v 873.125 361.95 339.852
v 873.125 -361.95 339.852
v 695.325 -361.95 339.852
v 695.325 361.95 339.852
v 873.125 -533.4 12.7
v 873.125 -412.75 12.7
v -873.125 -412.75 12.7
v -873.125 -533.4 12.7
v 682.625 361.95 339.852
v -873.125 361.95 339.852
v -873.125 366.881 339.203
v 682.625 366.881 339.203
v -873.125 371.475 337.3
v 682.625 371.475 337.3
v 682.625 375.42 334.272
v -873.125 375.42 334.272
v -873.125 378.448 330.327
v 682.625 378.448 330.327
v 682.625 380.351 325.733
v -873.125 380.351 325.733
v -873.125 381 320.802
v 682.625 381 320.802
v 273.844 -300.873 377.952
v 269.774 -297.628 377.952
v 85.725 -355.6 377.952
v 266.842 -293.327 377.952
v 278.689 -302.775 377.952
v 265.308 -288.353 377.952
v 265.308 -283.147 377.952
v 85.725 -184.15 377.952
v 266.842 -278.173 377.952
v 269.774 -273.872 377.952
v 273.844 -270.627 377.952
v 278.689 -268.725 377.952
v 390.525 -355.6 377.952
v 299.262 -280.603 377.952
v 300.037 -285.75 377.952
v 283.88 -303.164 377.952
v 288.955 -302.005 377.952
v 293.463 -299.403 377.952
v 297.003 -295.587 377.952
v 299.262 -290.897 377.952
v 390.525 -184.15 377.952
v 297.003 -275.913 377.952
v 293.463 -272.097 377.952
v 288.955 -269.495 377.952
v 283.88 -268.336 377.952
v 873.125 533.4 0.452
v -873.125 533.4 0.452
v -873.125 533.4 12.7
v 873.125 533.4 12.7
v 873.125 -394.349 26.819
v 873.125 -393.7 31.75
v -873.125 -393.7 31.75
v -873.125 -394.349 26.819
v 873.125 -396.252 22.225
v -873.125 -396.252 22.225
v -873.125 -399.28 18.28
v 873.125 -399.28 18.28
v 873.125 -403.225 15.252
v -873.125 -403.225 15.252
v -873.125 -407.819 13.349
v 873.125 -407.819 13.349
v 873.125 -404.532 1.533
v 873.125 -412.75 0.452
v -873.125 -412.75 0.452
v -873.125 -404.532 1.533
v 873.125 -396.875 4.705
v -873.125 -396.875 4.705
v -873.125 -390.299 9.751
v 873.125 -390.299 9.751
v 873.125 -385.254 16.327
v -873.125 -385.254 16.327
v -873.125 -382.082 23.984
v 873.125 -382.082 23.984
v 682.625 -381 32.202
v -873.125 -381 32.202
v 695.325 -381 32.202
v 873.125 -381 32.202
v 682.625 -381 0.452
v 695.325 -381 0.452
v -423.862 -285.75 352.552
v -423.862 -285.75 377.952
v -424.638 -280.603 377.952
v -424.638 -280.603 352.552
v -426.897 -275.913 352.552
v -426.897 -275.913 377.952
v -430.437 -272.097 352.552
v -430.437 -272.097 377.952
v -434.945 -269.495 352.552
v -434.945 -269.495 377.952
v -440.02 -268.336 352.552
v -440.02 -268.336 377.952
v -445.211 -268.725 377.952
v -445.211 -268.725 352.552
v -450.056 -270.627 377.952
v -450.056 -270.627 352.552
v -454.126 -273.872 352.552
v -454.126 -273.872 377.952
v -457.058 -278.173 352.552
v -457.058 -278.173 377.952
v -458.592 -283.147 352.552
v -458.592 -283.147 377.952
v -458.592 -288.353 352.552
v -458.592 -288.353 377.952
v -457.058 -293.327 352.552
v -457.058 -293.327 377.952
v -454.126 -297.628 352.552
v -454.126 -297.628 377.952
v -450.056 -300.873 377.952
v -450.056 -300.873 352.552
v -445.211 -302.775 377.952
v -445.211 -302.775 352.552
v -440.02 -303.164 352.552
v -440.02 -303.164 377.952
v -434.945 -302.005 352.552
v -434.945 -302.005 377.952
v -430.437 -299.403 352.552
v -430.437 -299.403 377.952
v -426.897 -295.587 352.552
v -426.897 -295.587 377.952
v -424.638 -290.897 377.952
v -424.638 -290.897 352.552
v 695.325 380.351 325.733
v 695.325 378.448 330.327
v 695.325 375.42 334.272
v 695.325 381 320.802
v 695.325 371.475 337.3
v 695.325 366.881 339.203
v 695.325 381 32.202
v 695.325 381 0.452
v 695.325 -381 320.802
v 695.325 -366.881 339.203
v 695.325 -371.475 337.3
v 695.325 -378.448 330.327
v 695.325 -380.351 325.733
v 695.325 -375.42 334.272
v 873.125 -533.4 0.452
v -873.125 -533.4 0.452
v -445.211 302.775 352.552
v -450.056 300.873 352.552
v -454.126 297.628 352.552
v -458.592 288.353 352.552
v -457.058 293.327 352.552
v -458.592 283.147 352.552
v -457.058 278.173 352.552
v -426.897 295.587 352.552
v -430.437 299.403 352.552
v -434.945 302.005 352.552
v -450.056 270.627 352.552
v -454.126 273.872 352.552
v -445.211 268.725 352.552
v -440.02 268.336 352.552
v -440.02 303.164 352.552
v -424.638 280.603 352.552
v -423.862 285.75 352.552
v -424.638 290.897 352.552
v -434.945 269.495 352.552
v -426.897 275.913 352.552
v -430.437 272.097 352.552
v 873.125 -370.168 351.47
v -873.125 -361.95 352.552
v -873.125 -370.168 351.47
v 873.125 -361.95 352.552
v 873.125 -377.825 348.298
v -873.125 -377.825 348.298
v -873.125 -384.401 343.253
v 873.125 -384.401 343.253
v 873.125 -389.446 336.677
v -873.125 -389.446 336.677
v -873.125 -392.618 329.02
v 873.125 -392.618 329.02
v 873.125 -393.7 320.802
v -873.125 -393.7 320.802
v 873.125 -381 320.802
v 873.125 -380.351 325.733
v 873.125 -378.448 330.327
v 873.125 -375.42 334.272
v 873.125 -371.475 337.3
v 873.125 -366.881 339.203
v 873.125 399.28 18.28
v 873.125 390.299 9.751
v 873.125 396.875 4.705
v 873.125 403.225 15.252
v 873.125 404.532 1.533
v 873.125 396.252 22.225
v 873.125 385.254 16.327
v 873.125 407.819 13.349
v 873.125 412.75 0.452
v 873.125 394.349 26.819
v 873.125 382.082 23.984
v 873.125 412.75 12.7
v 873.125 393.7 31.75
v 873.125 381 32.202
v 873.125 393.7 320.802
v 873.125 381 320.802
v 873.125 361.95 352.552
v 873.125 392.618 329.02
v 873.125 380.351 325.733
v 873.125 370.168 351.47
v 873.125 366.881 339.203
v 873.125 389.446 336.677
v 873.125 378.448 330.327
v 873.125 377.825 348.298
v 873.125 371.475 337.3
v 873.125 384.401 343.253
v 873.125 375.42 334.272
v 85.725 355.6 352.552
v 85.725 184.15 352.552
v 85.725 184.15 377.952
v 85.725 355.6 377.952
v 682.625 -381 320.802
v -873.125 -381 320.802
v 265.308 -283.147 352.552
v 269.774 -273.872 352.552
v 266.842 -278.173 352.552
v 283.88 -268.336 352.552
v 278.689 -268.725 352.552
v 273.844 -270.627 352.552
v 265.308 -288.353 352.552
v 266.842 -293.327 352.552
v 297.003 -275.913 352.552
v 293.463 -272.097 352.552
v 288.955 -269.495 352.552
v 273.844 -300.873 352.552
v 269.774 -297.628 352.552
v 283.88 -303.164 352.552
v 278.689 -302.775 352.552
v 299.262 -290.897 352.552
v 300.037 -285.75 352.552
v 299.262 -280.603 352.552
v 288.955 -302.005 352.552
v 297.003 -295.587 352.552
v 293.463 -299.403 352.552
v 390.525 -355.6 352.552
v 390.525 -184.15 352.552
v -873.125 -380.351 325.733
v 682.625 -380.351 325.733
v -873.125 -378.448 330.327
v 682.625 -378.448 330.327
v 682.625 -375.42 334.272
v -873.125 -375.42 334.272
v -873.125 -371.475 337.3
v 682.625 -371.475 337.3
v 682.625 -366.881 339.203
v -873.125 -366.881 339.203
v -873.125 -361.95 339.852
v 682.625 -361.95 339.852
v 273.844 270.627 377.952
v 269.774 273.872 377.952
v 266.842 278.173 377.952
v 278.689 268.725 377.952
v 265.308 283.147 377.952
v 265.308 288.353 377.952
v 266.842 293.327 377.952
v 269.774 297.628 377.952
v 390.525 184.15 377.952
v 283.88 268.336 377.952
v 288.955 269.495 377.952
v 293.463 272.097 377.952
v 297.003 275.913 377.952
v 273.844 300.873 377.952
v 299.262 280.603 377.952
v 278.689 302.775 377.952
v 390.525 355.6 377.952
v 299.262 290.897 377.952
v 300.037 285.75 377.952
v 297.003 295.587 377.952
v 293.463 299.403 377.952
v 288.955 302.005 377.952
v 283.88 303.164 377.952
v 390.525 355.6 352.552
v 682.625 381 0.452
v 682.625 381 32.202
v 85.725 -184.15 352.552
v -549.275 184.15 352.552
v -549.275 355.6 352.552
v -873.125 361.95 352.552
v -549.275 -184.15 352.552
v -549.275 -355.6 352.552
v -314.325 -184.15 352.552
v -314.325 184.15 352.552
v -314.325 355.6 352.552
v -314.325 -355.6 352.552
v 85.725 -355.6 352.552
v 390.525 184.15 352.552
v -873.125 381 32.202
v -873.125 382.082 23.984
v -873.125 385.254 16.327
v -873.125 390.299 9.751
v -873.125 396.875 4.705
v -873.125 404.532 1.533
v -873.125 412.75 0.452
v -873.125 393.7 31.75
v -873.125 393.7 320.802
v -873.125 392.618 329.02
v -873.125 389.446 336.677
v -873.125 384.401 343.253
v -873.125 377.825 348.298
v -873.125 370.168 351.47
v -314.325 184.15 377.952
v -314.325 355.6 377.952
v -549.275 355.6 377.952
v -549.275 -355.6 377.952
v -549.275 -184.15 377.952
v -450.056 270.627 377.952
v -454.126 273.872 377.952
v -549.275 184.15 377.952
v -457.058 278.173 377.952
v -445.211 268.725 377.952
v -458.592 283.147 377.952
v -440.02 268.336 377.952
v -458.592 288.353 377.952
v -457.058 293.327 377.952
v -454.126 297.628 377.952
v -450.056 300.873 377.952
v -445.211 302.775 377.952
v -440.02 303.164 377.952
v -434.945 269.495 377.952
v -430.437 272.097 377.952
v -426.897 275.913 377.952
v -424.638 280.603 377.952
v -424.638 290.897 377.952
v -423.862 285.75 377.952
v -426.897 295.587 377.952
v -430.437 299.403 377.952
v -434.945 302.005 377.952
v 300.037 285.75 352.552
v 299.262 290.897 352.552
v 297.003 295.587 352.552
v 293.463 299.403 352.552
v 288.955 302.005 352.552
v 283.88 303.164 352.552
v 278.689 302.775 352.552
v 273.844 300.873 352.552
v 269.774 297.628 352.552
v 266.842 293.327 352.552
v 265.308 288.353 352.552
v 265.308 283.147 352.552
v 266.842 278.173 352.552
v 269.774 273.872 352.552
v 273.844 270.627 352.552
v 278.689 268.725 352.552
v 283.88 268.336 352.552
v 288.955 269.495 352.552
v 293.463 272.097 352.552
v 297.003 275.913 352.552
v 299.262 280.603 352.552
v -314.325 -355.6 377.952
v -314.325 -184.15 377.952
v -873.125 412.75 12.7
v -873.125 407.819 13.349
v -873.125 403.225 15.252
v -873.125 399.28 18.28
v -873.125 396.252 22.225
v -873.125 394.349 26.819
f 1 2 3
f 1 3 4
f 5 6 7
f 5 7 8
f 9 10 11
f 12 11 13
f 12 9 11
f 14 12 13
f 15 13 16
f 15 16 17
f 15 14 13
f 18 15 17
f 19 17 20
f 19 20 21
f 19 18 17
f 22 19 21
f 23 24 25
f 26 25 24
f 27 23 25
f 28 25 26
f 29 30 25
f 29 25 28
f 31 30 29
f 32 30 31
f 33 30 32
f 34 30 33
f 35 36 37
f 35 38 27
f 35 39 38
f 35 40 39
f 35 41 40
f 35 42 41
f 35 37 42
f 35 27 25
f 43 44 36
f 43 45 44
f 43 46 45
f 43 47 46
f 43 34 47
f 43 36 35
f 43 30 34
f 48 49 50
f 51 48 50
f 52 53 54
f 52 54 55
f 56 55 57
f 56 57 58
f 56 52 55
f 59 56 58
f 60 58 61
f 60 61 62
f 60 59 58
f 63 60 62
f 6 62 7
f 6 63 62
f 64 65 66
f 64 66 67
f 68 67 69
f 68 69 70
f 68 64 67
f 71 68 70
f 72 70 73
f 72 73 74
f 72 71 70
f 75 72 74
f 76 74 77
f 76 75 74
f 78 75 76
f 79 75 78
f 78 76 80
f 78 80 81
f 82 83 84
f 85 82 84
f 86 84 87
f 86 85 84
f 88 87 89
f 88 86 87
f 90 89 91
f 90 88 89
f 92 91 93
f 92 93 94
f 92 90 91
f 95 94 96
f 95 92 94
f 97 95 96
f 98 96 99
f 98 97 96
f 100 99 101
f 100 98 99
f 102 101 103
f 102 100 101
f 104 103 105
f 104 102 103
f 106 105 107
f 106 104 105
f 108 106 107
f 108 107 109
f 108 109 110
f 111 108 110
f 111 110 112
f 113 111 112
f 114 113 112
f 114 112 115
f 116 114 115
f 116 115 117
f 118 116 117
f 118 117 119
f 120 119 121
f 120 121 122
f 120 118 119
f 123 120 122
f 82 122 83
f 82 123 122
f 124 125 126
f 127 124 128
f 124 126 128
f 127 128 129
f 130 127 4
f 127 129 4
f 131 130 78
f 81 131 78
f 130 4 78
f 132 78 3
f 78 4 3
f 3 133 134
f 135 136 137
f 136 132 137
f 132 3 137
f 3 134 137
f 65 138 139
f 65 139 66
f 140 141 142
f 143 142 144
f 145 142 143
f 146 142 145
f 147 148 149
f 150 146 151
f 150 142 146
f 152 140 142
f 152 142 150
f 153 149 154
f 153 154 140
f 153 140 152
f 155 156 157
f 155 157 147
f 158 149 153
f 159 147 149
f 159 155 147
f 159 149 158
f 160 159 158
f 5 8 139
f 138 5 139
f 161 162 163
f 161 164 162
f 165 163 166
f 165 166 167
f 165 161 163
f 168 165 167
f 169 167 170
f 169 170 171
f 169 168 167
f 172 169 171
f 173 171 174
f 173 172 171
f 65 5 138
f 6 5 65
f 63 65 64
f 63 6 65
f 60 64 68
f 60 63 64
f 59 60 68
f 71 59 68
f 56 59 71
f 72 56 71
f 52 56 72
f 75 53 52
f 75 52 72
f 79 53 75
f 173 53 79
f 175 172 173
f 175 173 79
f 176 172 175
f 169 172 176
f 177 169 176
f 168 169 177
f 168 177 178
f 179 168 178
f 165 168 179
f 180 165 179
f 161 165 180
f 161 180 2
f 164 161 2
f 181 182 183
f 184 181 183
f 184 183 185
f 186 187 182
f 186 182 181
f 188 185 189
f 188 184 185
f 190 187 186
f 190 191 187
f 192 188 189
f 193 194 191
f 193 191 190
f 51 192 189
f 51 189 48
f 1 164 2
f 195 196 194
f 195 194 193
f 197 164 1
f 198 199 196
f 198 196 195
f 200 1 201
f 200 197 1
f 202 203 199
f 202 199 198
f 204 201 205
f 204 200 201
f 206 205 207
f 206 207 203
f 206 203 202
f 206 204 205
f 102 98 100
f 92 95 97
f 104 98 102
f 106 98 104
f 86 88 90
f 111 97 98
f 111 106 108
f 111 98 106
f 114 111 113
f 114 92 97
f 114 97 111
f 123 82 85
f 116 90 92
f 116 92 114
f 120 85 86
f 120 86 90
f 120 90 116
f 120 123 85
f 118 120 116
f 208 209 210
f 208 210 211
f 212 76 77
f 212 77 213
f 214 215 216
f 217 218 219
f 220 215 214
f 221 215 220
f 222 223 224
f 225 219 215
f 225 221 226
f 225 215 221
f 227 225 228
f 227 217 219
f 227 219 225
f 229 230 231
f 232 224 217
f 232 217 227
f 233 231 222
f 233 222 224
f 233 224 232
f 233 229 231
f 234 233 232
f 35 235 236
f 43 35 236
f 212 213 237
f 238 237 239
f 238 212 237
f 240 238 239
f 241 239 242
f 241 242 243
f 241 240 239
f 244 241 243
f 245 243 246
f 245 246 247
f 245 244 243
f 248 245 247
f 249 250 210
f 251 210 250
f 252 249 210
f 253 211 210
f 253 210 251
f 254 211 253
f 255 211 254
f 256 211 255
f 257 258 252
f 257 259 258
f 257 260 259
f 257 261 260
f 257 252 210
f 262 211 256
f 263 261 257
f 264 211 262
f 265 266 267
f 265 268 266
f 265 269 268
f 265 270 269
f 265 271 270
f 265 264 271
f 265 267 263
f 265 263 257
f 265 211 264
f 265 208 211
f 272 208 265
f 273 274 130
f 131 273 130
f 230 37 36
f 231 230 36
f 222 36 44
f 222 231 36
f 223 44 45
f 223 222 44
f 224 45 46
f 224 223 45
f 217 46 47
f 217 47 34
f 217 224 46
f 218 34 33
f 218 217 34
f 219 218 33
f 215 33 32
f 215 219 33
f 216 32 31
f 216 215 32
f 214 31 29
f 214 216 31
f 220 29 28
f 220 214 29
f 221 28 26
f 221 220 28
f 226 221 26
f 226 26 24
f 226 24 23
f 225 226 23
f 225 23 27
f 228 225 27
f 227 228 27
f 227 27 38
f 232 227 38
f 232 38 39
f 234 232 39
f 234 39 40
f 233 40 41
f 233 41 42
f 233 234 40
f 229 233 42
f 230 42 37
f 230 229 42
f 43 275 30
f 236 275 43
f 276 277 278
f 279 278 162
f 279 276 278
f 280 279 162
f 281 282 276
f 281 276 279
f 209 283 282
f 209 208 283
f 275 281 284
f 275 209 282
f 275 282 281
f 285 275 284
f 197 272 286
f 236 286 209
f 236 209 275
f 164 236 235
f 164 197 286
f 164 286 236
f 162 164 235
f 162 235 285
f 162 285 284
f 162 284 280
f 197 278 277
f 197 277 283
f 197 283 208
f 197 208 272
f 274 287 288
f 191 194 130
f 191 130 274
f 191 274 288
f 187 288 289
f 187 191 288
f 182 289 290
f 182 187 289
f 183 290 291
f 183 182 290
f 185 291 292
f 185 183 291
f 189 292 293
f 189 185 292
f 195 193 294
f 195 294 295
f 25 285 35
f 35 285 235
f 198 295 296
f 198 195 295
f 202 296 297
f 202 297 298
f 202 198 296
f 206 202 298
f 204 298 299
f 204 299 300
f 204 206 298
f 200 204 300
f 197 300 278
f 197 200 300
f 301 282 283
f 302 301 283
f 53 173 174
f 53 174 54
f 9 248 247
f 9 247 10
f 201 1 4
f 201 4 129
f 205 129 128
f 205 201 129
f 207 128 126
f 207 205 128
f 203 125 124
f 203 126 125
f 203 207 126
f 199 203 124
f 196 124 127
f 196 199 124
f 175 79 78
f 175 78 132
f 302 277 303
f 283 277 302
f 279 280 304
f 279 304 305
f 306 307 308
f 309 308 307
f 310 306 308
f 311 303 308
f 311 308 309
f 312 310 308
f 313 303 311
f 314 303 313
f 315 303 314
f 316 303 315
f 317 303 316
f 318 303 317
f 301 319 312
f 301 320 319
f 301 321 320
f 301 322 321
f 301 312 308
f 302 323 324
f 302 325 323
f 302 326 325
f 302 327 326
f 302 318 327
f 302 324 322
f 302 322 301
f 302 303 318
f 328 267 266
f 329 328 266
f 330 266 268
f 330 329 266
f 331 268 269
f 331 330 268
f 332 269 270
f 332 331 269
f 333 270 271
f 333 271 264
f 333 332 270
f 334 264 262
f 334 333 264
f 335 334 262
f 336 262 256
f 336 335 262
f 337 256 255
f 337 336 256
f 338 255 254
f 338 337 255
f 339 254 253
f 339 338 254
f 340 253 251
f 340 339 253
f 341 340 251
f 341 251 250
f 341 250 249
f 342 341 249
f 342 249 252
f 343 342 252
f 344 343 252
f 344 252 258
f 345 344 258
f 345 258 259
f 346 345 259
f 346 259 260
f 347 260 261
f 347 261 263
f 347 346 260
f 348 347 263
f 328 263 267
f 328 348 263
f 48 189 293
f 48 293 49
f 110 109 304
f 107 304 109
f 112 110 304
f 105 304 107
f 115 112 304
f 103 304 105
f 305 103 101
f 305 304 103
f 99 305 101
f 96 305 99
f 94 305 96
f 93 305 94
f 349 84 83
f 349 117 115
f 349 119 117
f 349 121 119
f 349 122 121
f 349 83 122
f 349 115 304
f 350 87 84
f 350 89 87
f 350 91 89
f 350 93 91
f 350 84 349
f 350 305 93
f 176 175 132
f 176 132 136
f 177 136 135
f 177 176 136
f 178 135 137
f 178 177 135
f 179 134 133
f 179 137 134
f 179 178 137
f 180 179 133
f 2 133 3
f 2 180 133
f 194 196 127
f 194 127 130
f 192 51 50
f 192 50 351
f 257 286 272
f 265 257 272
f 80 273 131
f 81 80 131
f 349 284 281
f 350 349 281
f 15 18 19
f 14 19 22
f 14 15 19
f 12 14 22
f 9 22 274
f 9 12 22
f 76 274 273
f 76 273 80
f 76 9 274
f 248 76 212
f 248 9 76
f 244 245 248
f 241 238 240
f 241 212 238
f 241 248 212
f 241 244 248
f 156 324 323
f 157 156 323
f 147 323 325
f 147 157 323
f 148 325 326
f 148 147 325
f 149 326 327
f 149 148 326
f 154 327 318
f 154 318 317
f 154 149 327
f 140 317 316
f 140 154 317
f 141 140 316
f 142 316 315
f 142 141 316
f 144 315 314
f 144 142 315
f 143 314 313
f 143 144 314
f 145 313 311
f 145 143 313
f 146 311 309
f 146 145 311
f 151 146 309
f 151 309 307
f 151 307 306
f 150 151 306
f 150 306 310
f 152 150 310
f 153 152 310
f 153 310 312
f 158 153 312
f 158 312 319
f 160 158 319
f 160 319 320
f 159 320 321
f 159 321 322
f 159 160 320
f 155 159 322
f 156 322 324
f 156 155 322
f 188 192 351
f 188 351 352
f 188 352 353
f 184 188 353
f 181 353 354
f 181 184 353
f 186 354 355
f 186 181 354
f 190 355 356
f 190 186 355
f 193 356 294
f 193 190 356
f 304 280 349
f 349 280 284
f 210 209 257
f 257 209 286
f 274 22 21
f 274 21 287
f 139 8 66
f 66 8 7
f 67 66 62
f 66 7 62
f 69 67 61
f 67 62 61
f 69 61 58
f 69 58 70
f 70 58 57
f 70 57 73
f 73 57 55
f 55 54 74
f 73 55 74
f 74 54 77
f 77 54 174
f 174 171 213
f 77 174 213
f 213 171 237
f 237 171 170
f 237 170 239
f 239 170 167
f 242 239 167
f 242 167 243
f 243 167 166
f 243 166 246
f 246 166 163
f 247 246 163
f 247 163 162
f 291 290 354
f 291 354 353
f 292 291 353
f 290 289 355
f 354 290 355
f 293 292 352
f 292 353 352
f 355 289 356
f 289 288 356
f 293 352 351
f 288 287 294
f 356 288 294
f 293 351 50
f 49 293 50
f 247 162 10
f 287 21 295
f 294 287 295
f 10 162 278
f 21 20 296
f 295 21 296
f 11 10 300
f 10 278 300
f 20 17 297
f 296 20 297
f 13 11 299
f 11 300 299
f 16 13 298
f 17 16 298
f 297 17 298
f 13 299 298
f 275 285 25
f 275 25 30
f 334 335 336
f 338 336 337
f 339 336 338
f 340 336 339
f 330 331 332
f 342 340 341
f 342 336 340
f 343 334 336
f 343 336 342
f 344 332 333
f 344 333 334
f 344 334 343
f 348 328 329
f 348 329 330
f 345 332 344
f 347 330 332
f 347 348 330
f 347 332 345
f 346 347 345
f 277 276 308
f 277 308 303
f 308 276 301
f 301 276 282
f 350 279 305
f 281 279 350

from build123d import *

# Parameters (mm, degrees)
F1_DEPTH = 873.125
F2_W     = 12.7
F2_H     = 762
F3_DEPTH = 339.400452
F4_W     = 234.95
F4_H     = 171.45
F4_R     = 17.4625
F4_W_2   = 304.8
F5_DEPTH = 25.4


with BuildPart() as f1:
    # F0 (on Right) → F1 (new body, symmetric)
    with BuildSketch(Plane.YZ):
        with BuildLine():
            Line((0, 339.852), (0, 352.552))
            Line((0, 352.552), (-361.95, 352.552))
            ThreePointArc((-361.95, 352.552), (-384.40064, 343.25264), (-393.7, 320.802))
            Line((-393.7, 320.802), (-393.7, 31.75))
            ThreePointArc((-393.7, 31.75), (-399.279616, 18.279616), (-412.75, 12.7))
            Line((-412.75, 12.7), (-516.630888, 12.7))
            Line((-516.630888, 12.7), (-520.7, 12.7))
            Line((-520.7, 12.7), (-533.4, 12.7))
            Line((-533.4, 12.7), (-533.4, 0.451548))
            Line((-533.4, 0.451548), (-412.75, 0.451548))
            ThreePointArc((-412.75, 0.451548), (-390.29936, 9.750908), (-381, 32.201548))
            Line((-381, 32.201548), (-381, 320.802))
            ThreePointArc((-381, 320.802), (-375.420384, 334.272384), (-361.95, 339.852))
            Line((-361.95, 339.852), (0, 339.852))
        make_face()
        with BuildLine():
            Line((361.95, 352.552), (0, 352.552))
            Line((0, 352.552), (0, 339.852))
            Line((0, 339.852), (361.95, 339.852))
            ThreePointArc((361.95, 339.852), (375.420384, 334.272384), (381, 320.802))
            Line((381, 320.802), (381, 32.201548))
            ThreePointArc((381, 32.201548), (390.29936, 9.750908), (412.75, 0.451548))
            Line((412.75, 0.451548), (533.4, 0.451548))
            Line((533.4, 0.451548), (533.4, 12.7))
            Line((533.4, 12.7), (520.7, 12.7))
            Line((520.7, 12.7), (516.630888, 12.7))
            Line((516.630888, 12.7), (412.75, 12.7))
            ThreePointArc((412.75, 12.7), (399.279616, 18.279616), (393.7, 31.75))
            Line((393.7, 31.75), (393.7, 320.802))
            ThreePointArc((393.7, 320.802), (384.40064, 343.25264), (361.95, 352.552))
        make_face()
    extrude(amount=F1_DEPTH, both=True)

    # F2 (on face) → F3 (join, through all)
    with BuildSketch(Plane(origin=(0, 0, 339.852), x_dir=(1, 0, 0), z_dir=(0, 0, -1))):
        with Locations((688.975, 0)):
            Rectangle(F2_W, F2_H)
    extrude(amount=F3_DEPTH)

    # F4 (on face) → F5 (join)
    with BuildSketch(Plane.XY.offset(352.552)):
        with Locations((-431.8, 269.875)):
            Rectangle(F4_W, F4_H)
        with Locations((-441.325, 285.75)):
            Circle(F4_R, mode=Mode.SUBTRACT)
        with Locations((238.125, 269.875)):
            Rectangle(F4_W_2, F4_H)
        with Locations((282.575, 285.75)):
            Circle(F4_R, mode=Mode.SUBTRACT)
        with Locations((238.125, -269.875)):
            Rectangle(F4_W_2, F4_H)
        with Locations((282.575, -285.75)):
            Circle(F4_R, mode=Mode.SUBTRACT)
        with Locations((-431.8, -269.875)):
            Rectangle(F4_W, F4_H)
        with Locations((-441.325, -285.75)):
            Circle(F4_R, mode=Mode.SUBTRACT)
    extrude(amount=F5_DEPTH)


solid = f1.part
